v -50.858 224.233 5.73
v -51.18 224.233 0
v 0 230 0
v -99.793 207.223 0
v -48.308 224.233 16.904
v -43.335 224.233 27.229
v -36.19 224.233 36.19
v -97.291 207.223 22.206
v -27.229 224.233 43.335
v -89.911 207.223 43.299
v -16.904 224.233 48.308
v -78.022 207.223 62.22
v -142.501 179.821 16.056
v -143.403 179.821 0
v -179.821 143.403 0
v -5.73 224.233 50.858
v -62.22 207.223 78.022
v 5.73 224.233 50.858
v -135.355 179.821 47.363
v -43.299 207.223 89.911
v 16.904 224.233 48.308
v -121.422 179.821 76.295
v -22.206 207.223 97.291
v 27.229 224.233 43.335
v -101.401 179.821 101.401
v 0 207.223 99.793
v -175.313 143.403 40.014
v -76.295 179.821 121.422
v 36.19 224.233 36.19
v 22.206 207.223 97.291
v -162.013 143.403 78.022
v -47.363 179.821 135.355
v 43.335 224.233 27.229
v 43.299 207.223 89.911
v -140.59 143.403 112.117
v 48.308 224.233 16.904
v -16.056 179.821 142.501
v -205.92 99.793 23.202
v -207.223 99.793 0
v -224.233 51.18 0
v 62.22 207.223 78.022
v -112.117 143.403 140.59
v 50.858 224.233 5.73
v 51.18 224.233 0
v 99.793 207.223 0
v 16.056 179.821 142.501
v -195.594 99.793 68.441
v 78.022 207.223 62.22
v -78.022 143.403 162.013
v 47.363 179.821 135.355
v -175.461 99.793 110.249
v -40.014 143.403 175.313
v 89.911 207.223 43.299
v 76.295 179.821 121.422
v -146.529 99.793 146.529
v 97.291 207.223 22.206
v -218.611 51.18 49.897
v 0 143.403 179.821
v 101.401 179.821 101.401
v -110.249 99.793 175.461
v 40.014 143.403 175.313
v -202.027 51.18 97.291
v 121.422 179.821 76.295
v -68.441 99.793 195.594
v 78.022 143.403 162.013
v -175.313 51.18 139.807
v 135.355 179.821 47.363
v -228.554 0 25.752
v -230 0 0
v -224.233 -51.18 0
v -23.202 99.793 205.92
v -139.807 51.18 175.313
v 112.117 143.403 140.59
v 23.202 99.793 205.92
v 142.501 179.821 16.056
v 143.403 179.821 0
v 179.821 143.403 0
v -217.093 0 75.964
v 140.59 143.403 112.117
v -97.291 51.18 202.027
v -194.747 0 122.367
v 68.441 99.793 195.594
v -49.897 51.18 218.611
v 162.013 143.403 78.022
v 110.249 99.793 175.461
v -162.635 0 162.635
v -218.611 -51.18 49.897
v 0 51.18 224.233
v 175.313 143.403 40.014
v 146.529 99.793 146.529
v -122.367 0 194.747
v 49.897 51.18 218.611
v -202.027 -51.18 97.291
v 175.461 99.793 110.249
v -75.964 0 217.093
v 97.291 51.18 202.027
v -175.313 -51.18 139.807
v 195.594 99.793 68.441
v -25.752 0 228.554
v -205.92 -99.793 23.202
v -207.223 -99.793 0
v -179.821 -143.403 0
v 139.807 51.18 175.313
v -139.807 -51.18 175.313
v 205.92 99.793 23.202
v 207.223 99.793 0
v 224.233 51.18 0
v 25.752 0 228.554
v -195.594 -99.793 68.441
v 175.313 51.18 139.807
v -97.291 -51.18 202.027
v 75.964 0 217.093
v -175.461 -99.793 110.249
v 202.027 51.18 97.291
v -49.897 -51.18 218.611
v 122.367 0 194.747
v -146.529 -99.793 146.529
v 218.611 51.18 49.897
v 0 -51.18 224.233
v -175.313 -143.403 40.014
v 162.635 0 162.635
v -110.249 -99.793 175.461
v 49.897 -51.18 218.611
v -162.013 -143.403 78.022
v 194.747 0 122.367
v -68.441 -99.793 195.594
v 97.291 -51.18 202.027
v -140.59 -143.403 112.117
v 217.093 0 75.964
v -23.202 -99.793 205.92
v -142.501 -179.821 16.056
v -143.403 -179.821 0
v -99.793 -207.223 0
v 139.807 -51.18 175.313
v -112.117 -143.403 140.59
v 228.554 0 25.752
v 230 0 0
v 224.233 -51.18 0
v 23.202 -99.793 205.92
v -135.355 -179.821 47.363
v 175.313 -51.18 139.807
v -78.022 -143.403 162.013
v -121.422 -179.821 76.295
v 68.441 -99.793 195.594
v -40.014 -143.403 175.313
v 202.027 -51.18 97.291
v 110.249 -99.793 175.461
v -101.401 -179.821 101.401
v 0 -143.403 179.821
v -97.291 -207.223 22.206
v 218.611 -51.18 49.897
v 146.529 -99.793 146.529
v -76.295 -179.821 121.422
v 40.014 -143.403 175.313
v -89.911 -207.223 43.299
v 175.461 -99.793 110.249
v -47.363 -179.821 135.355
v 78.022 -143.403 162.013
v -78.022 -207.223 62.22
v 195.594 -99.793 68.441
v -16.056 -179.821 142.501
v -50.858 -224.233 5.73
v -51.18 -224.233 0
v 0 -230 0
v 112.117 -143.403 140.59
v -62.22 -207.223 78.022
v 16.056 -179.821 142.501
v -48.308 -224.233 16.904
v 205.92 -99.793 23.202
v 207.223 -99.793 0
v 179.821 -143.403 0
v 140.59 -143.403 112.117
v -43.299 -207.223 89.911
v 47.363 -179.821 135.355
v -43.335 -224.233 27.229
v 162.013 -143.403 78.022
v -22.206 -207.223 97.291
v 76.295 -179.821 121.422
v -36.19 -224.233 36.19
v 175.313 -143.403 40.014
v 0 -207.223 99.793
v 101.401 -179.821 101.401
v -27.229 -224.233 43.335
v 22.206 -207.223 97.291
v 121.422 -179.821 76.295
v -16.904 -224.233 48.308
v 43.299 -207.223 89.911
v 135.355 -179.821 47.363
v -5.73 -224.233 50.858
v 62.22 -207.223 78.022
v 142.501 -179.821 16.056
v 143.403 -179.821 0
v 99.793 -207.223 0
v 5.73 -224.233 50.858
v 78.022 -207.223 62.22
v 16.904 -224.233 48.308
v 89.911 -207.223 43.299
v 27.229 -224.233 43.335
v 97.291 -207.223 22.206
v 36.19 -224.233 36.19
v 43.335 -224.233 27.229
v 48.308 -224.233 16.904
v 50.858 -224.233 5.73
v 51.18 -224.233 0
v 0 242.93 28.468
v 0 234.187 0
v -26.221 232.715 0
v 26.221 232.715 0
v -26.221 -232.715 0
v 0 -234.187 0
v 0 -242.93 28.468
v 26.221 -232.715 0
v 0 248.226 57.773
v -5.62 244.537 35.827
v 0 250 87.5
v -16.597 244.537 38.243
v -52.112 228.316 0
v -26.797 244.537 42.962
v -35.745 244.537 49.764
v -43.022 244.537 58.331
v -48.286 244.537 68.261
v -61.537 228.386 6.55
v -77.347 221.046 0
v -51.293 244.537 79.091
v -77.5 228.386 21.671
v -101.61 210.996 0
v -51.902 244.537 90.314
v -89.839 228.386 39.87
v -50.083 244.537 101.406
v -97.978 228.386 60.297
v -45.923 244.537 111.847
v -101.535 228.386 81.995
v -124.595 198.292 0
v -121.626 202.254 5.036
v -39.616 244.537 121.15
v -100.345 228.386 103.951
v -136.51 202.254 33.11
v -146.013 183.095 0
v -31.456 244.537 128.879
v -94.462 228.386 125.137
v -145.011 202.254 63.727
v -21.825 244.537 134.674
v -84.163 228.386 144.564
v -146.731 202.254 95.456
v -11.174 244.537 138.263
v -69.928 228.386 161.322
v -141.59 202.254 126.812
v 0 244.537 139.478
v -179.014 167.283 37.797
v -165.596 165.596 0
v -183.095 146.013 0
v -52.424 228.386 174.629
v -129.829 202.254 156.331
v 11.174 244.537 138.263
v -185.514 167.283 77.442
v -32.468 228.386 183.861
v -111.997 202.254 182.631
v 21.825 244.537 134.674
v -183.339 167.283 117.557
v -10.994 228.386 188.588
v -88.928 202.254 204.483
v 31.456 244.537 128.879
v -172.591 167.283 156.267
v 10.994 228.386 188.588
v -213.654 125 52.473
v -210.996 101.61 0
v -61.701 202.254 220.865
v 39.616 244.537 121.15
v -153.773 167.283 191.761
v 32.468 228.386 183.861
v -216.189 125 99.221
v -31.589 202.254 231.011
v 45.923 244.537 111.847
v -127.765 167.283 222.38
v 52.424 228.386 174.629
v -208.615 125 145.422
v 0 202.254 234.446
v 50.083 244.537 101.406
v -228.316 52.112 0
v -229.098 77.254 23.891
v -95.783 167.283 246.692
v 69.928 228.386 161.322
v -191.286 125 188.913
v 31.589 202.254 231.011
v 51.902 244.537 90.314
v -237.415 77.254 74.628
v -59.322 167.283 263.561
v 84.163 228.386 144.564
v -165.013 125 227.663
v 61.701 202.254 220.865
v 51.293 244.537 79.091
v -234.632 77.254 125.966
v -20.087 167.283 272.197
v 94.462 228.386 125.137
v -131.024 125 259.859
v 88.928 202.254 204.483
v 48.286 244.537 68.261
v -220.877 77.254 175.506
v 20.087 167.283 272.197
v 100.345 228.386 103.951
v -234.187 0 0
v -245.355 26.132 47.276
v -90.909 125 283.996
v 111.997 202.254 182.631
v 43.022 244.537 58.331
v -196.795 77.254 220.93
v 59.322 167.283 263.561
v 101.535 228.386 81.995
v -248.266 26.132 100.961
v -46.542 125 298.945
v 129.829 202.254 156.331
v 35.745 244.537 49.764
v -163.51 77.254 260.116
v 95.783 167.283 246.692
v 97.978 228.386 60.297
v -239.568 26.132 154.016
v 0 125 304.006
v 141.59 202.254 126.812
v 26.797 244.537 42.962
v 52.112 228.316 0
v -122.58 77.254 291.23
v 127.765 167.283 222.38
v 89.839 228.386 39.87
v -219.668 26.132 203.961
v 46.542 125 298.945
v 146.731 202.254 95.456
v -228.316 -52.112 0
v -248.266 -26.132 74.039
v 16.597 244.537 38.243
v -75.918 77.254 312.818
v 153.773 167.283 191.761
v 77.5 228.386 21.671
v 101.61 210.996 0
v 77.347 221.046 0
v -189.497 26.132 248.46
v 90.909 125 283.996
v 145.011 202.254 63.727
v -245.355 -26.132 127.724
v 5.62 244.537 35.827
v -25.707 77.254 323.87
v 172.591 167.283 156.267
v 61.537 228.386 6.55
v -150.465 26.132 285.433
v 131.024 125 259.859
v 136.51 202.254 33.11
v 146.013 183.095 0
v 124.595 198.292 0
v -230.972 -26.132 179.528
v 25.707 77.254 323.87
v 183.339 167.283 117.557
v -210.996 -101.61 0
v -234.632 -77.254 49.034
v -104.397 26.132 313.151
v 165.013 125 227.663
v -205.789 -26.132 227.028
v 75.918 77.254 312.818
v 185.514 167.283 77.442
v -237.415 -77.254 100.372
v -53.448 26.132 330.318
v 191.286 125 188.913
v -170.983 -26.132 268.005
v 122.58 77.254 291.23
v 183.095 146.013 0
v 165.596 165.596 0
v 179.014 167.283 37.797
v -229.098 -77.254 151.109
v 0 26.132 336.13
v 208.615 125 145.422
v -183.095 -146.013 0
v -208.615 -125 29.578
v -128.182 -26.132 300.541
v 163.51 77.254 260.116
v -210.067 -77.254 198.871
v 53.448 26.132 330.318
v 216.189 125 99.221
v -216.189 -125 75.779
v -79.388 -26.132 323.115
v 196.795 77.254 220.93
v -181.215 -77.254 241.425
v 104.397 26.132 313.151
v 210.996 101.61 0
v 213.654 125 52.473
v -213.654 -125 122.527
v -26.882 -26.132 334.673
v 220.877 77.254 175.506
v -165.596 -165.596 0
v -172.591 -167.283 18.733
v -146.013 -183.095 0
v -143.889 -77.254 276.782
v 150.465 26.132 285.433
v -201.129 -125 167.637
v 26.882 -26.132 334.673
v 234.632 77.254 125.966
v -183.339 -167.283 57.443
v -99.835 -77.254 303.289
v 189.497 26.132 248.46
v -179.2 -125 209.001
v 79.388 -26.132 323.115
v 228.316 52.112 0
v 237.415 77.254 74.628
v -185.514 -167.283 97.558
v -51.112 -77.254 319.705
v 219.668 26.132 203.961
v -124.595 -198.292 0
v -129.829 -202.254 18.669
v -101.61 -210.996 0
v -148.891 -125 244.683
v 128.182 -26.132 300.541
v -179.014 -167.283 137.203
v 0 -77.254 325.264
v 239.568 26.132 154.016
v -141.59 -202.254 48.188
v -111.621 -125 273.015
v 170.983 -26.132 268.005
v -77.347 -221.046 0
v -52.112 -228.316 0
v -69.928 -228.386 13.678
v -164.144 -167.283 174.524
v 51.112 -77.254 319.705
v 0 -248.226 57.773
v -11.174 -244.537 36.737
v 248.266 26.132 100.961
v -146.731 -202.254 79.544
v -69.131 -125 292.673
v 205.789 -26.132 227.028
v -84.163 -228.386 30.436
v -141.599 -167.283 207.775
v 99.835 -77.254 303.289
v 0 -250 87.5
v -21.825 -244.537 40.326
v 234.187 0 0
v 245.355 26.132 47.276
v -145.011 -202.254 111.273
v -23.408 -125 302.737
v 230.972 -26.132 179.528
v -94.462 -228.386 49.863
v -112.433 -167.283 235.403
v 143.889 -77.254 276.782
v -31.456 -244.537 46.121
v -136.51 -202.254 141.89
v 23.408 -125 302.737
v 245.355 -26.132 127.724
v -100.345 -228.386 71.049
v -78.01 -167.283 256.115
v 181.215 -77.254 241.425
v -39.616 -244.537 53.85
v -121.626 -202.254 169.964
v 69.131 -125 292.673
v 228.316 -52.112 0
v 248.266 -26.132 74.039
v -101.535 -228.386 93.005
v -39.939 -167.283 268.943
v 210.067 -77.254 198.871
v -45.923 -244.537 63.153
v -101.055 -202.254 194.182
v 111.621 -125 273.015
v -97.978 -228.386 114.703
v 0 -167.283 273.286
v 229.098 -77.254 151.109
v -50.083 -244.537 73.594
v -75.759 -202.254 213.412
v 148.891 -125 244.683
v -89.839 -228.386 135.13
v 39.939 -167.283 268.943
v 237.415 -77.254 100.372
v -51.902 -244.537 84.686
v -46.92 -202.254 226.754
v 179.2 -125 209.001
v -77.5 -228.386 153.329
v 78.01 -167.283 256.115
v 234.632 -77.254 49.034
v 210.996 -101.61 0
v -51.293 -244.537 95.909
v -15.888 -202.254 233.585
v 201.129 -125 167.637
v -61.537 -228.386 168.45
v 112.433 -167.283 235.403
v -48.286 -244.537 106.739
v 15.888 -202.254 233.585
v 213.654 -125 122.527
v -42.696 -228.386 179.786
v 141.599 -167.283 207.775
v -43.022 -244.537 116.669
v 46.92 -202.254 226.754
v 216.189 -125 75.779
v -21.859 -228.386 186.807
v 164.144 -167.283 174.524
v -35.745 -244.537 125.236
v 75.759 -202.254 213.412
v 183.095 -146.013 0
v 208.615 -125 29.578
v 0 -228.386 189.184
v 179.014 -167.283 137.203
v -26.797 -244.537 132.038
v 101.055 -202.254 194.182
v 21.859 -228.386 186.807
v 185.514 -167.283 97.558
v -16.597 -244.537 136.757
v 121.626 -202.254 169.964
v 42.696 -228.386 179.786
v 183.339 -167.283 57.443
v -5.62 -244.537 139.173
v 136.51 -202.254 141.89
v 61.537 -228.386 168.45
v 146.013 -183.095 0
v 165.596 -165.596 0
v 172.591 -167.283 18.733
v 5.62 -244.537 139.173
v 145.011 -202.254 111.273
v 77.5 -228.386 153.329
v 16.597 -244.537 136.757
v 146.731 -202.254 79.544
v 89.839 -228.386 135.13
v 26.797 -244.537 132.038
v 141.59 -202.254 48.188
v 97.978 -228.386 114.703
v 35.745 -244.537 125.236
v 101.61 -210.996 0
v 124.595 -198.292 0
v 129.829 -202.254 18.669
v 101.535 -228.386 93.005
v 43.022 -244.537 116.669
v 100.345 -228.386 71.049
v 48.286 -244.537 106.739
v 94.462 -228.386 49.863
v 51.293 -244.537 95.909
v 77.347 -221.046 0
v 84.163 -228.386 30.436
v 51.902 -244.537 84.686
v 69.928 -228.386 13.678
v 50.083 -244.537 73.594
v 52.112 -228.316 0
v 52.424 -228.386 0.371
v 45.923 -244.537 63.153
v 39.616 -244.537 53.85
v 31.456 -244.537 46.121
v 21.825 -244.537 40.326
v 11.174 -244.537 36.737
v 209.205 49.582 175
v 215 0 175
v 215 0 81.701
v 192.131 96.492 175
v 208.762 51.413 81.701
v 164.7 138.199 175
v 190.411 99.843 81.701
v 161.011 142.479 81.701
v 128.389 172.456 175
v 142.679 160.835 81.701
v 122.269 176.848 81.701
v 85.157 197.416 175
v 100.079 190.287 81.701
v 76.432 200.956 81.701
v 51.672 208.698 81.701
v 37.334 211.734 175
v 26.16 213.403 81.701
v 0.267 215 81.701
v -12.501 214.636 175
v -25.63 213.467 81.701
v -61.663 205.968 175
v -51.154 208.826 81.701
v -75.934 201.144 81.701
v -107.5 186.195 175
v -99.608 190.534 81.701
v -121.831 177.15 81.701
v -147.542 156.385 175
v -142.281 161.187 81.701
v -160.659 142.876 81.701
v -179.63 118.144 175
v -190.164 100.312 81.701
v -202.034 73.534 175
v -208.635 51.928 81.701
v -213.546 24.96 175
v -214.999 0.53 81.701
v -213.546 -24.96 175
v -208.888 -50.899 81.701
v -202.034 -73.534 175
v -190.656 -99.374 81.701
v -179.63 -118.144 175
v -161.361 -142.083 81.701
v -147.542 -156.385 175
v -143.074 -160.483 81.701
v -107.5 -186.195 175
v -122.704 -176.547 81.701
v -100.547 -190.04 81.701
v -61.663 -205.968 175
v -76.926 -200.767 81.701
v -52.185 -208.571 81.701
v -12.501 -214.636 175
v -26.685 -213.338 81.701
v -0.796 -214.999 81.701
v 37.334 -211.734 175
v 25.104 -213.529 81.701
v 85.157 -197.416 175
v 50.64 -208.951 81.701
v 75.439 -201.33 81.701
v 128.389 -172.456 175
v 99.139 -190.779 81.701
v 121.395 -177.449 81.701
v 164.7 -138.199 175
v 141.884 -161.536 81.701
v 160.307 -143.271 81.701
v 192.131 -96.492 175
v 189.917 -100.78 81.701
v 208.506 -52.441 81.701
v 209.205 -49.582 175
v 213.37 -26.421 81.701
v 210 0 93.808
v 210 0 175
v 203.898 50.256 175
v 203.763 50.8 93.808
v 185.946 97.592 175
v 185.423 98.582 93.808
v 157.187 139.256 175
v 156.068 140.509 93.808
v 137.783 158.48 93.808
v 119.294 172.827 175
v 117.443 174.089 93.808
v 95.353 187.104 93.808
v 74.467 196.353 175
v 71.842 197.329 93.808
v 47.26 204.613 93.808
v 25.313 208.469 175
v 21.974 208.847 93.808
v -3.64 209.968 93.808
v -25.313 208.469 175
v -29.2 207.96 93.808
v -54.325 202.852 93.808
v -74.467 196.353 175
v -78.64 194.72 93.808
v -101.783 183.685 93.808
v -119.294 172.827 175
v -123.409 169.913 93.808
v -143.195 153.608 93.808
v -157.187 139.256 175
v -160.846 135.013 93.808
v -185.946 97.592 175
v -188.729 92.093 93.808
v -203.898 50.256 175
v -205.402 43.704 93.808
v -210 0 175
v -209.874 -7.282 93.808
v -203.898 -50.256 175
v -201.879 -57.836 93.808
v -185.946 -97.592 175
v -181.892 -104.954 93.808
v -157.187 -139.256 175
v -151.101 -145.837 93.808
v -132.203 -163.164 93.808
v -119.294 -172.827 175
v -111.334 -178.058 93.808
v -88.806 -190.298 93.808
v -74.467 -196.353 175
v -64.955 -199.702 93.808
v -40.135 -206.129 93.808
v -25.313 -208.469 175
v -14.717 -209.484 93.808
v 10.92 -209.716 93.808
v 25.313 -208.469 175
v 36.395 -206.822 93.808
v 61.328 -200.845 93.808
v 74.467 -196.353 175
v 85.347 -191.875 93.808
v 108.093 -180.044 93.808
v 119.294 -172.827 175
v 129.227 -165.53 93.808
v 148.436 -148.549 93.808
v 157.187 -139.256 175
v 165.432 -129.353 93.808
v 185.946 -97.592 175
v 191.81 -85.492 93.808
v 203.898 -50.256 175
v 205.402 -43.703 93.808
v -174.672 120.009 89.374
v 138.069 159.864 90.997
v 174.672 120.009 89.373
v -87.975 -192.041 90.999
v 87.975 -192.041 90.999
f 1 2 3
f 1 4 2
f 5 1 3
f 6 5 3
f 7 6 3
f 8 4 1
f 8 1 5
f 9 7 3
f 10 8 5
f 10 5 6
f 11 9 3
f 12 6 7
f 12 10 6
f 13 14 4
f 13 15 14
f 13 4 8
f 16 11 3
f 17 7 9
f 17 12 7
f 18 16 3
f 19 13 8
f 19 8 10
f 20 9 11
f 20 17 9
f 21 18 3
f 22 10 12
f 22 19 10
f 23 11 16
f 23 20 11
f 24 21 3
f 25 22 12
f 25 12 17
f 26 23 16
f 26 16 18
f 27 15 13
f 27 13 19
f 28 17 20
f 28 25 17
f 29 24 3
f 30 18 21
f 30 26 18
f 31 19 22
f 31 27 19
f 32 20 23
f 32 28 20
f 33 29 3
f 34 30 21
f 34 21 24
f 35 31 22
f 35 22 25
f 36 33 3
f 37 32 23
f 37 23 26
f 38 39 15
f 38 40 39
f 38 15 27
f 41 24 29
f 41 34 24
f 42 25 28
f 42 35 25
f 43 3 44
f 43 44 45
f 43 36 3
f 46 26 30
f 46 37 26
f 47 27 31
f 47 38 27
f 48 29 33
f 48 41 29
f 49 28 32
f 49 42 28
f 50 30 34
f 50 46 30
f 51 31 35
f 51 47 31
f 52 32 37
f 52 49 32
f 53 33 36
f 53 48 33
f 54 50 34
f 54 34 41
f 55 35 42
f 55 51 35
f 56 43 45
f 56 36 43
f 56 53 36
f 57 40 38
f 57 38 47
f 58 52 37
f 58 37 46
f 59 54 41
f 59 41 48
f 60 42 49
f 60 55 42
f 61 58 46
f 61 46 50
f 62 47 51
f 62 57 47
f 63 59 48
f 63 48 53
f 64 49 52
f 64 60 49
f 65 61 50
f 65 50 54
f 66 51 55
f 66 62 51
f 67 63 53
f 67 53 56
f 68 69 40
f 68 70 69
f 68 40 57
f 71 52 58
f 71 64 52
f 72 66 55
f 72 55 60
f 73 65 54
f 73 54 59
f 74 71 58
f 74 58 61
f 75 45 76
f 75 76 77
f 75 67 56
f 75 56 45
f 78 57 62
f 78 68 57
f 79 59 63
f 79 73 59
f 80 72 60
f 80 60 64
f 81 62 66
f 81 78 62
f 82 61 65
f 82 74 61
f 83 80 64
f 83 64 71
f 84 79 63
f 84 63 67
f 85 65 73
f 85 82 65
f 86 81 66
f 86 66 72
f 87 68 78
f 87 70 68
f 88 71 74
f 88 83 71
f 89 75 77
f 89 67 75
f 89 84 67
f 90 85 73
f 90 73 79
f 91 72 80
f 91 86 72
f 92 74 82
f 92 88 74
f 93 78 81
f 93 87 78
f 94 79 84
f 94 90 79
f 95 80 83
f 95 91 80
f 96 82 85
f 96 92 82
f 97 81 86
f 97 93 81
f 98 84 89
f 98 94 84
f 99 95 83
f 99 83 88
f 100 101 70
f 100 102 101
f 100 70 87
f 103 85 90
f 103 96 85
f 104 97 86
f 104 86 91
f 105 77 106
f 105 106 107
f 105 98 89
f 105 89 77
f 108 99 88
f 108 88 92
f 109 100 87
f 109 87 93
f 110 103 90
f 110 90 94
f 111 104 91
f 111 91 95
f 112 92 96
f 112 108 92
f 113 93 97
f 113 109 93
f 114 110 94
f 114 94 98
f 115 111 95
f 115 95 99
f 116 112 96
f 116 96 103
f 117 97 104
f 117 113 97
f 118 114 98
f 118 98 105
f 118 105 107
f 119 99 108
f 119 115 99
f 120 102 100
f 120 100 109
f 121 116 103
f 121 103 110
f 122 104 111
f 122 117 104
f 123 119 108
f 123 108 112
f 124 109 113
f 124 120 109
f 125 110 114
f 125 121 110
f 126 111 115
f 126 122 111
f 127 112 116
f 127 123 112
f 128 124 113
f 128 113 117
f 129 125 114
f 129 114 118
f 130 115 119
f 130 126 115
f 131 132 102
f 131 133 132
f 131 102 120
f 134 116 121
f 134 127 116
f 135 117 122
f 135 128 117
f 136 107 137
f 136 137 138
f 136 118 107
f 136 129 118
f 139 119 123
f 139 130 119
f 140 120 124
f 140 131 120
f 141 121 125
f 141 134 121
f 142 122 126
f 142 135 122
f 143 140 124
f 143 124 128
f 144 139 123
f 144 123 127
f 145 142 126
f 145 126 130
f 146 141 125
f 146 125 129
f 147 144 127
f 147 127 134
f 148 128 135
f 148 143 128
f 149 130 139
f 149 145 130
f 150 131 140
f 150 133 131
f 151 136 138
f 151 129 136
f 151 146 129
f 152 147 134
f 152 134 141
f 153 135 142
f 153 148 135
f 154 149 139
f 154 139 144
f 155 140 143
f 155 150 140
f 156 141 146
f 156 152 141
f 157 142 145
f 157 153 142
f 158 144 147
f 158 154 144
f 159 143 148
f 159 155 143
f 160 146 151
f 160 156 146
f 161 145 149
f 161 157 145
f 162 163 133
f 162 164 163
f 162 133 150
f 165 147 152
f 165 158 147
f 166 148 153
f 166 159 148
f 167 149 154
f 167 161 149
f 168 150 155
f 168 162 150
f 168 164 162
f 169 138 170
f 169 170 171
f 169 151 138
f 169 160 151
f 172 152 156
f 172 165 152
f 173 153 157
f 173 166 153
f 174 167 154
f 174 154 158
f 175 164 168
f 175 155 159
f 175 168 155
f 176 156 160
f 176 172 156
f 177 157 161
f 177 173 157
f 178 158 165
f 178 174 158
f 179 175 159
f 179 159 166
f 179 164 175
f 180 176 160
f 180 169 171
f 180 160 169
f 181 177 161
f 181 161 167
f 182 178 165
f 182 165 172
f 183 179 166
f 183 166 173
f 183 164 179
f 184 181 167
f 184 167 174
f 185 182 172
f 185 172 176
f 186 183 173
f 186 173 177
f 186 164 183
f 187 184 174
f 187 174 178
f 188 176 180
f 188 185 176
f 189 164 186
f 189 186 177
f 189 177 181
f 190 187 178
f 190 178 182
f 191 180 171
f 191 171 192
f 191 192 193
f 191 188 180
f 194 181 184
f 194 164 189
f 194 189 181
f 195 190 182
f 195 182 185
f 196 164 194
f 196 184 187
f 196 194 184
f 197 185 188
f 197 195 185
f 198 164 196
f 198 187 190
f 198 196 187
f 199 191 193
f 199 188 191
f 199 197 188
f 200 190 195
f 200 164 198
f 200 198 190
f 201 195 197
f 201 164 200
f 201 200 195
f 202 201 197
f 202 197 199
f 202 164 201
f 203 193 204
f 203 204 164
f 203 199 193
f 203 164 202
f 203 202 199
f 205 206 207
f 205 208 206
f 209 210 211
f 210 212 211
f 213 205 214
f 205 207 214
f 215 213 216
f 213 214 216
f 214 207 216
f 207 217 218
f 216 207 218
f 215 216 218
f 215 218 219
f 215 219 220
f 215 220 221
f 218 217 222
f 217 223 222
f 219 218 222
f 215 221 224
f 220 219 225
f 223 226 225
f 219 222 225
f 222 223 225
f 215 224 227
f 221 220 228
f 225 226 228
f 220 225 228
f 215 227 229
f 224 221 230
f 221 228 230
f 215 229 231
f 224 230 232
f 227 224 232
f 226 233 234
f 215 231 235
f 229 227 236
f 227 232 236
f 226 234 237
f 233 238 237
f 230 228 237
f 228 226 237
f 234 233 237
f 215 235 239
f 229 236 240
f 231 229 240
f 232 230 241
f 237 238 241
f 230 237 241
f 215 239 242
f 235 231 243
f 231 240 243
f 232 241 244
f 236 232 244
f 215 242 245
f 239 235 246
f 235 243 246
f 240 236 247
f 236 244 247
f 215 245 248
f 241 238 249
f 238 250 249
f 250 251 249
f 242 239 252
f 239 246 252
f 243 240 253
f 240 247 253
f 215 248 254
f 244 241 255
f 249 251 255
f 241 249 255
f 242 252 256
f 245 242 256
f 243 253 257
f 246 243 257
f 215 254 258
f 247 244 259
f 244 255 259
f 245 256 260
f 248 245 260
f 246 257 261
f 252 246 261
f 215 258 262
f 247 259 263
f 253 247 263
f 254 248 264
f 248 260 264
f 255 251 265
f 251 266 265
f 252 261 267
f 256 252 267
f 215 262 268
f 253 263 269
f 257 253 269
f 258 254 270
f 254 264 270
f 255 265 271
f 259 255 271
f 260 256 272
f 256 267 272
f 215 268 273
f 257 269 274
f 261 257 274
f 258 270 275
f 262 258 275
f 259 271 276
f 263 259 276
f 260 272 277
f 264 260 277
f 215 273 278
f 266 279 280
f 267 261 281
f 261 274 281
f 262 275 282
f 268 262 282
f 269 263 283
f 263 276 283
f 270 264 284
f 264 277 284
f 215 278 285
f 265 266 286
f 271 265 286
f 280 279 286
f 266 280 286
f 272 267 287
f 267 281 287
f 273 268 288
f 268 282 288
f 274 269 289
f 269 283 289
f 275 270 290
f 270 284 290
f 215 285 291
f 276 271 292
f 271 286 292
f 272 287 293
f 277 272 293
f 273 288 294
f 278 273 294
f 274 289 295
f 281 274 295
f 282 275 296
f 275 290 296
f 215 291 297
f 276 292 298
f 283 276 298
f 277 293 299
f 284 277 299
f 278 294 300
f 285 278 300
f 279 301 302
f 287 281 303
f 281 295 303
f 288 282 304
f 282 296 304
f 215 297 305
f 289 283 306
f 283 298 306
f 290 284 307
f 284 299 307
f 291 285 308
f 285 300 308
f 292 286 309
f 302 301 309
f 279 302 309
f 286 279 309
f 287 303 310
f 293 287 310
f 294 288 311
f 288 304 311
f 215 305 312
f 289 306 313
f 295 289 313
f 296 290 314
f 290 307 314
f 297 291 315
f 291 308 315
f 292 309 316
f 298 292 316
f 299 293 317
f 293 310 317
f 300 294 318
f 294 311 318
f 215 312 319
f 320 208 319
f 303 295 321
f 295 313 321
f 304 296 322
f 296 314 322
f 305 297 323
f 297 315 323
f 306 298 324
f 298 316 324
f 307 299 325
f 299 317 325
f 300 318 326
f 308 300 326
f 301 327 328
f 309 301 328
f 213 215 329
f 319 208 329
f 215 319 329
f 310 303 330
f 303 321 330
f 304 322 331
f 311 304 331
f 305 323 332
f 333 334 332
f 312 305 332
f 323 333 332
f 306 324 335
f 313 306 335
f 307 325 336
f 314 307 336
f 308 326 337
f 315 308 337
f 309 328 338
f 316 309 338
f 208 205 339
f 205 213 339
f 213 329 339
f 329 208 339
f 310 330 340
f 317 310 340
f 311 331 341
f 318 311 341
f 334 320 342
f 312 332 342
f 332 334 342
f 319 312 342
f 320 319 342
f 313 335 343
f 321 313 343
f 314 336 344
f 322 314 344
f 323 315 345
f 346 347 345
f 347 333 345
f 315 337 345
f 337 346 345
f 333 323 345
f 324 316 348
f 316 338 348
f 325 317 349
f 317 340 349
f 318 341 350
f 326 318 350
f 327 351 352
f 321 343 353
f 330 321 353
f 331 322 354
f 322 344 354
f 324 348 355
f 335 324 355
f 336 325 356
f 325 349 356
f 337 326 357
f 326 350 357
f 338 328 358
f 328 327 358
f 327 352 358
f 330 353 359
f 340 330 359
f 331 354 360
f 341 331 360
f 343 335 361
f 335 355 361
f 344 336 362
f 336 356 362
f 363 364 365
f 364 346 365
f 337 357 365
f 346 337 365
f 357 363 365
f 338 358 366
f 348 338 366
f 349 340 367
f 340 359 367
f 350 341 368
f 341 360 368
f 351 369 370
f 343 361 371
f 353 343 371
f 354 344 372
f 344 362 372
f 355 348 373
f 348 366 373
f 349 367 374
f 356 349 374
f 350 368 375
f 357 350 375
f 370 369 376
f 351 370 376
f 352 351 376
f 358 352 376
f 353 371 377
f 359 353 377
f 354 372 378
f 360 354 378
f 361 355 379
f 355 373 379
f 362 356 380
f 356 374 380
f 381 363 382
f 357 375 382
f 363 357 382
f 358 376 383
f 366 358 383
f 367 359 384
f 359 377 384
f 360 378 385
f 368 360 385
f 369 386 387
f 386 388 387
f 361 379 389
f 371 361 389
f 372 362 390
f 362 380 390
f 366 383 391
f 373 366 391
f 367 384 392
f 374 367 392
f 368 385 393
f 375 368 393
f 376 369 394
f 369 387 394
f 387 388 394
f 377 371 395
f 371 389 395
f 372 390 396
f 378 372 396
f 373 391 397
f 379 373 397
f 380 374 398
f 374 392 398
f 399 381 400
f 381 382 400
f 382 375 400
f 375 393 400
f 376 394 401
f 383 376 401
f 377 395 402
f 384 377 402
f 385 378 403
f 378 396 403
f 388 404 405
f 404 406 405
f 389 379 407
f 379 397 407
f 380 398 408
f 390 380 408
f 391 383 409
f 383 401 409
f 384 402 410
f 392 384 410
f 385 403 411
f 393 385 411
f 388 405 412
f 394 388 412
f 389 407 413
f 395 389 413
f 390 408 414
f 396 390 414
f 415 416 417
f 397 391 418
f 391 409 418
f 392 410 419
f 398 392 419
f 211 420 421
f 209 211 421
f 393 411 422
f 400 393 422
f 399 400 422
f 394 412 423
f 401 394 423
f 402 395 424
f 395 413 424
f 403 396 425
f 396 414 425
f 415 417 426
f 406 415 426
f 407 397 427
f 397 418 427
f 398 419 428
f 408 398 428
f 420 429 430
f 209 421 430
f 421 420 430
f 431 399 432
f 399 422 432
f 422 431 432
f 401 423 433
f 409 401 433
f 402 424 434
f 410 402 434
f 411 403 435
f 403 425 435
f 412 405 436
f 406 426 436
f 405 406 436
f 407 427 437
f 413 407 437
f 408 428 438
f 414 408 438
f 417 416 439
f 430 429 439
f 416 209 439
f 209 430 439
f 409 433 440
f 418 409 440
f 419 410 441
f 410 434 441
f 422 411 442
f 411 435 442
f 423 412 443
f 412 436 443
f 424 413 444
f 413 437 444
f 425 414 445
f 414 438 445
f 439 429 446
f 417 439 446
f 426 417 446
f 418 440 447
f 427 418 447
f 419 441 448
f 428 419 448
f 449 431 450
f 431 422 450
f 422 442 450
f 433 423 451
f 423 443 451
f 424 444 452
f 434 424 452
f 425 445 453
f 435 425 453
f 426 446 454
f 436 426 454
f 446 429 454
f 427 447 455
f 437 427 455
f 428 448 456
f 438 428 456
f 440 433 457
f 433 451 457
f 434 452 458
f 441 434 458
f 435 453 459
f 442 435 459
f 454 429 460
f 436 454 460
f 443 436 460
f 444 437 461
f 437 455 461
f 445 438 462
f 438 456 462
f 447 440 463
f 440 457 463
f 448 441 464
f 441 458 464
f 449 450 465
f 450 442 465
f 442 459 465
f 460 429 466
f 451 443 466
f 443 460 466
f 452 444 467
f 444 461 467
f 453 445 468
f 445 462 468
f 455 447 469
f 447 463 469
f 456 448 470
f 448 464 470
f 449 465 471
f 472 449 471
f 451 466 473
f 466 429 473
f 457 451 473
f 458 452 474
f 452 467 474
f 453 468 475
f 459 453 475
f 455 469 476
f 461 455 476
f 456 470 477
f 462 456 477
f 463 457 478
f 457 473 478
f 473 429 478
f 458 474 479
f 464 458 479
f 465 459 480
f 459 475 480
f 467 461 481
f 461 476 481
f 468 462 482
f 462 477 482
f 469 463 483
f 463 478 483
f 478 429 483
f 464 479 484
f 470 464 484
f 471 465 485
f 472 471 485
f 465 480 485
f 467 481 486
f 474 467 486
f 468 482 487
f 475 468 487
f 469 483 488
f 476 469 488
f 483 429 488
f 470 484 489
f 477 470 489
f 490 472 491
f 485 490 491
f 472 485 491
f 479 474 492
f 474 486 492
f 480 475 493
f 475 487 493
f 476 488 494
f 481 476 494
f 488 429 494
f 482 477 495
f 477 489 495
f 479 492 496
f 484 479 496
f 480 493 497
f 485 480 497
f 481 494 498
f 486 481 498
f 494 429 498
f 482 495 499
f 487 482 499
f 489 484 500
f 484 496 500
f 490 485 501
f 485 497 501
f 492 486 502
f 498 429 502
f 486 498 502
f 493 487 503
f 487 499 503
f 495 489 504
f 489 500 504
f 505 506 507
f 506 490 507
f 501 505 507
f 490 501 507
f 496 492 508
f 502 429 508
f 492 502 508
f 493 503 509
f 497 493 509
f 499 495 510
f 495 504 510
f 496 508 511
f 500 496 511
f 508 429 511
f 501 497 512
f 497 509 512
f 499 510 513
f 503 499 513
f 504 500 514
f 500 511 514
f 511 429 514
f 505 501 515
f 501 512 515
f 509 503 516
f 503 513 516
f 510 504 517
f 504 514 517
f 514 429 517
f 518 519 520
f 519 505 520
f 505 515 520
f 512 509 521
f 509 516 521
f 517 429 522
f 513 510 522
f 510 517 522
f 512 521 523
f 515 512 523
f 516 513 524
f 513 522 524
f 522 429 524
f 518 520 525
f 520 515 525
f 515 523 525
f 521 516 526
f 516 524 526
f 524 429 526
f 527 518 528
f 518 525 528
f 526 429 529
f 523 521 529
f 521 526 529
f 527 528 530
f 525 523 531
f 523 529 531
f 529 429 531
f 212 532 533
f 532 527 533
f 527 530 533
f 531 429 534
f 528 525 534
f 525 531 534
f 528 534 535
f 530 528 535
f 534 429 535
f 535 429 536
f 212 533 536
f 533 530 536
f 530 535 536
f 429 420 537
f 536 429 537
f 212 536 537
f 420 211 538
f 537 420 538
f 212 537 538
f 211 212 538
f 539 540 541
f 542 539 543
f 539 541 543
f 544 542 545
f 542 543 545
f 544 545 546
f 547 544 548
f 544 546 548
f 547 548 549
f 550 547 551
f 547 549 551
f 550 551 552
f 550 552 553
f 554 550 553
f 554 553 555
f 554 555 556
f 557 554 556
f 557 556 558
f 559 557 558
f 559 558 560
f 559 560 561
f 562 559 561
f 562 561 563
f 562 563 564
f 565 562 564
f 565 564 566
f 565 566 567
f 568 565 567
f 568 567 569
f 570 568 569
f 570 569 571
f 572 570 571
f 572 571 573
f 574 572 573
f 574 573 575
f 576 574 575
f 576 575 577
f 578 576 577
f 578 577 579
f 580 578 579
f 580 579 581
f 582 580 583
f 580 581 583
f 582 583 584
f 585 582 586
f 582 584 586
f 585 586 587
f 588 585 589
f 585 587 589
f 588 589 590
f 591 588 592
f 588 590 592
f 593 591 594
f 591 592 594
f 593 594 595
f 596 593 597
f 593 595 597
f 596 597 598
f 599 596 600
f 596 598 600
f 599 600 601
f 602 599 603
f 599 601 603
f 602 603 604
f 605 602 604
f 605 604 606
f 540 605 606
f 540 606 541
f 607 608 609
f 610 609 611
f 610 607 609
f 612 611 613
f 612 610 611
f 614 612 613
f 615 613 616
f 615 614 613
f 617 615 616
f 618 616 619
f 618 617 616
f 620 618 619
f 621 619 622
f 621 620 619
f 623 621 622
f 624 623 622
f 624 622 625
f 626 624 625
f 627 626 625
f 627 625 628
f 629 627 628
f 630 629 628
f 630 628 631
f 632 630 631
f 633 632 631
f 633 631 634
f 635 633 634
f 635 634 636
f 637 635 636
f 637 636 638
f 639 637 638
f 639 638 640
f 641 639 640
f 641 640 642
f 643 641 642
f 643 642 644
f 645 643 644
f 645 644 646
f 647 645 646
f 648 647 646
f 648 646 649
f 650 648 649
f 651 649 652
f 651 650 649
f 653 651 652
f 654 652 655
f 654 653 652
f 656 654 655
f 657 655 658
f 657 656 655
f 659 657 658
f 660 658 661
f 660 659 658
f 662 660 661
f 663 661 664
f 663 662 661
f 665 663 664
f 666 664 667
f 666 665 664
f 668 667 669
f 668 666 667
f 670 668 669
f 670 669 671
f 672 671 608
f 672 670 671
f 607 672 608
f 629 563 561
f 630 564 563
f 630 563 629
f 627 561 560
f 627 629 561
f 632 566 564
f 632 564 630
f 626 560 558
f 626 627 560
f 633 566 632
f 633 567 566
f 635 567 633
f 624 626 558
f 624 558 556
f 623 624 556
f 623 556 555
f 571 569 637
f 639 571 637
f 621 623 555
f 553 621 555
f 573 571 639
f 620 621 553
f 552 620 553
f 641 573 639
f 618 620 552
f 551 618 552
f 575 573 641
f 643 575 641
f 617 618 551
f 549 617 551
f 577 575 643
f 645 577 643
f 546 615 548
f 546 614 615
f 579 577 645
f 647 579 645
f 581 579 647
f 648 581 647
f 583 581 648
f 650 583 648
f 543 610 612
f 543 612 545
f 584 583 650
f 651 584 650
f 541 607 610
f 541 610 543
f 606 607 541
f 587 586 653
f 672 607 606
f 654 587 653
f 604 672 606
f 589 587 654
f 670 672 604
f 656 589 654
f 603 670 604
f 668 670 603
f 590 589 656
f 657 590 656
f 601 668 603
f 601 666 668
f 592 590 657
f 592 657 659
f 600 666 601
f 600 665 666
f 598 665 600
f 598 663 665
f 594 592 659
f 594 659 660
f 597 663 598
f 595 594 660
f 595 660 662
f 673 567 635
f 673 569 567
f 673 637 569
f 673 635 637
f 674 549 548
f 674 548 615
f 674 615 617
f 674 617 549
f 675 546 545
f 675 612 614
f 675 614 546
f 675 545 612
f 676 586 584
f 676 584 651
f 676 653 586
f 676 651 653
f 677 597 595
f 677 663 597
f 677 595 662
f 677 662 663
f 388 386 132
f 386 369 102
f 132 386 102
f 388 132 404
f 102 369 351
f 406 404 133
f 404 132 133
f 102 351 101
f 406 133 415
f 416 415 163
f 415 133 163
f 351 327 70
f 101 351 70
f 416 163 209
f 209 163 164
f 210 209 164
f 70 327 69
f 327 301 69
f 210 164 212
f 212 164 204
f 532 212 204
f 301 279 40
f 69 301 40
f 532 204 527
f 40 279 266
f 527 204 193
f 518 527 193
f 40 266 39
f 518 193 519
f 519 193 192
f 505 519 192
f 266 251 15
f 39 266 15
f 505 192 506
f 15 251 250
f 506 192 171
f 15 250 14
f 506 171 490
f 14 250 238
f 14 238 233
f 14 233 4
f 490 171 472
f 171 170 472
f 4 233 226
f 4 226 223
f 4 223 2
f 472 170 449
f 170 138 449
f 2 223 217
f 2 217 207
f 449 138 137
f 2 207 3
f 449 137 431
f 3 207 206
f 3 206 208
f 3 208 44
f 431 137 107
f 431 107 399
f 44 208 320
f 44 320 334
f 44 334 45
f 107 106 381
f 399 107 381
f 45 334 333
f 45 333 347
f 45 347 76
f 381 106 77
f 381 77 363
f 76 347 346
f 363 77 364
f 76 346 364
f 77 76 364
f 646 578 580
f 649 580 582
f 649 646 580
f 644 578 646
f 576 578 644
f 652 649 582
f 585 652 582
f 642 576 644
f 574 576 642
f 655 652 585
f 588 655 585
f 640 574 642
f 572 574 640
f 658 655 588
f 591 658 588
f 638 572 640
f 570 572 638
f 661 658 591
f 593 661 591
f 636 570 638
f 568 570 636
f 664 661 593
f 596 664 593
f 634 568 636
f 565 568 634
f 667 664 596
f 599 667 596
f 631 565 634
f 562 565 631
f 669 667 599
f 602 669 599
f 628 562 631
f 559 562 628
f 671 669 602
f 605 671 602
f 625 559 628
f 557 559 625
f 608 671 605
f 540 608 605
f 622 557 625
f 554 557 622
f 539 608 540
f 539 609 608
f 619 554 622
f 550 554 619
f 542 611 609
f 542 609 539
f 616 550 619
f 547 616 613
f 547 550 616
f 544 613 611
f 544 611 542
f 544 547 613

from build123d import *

# Parameters (mm, degrees)
SKETCH_4_R              = 215
SKETCH_4_R_2            = 210
EXTRUDE_1_DEPTH         = 175
CUT_EXTRUDE_START       = -162.5
CUT_EXTRUDE_3_OUTLINE_W = 472
CUT_EXTRUDE_3_OUTLINE_H = 472
CUT_EXTRUDE_3_DEPTH     = 162.5


# Read off the part's stored shape, not the designer's step: 切除-拉伸3
with BuildPart() as part:
    # 草图4 → 凸台-拉伸1 (new body)
    with BuildSketch(Plane.XY):
        Circle(SKETCH_4_R)
        Circle(SKETCH_4_R_2, mode=Mode.SUBTRACT)
    extrude(amount=EXTRUDE_1_DEPTH)


with BuildPart() as body_2:
    # 草图5 → 旋转5 (revolve)
    with BuildSketch(Plane(origin=(0, 0, 0), x_dir=(0, 0, -1), z_dir=(1, 0, 0))):
        with BuildLine():
            Line((-87.5, -250), (-87.5, 250))
            ThreePointArc((-87.5, 250), (162.5, 0), (-87.5, -250))
        make_face()
    revolve(axis=Axis((0, -250, 87.5), (0, 1, 0)))

    # 切除-拉伸3 outline → 切除-拉伸3 (cut)
    with BuildSketch(Plane.XY.offset(CUT_EXTRUDE_START)):
        Rectangle(CUT_EXTRUDE_3_OUTLINE_W, CUT_EXTRUDE_3_OUTLINE_H)
    extrude(amount=CUT_EXTRUDE_3_DEPTH, mode=Mode.SUBTRACT)


with BuildPart() as cut_revolve_2_tool:
    # 草图8 → 切除-旋转2 (revolve)
    with BuildSketch(Plane.XY):
        with BuildLine():
            Line((0, -230), (0, 230))
            ThreePointArc((0, 230), (230, 0), (0, -230))
        make_face()
    revolve(axis=Axis((0, -230, 0), (0, 1, 0)))


with BuildPart() as part_1:
    add(part.part)

    # 切除-旋转2: cut by cut_revolve_2_tool
    add(cut_revolve_2_tool.part, mode=Mode.SUBTRACT)


with BuildPart() as body_2_1:
    add(body_2.part)

    # 切除-旋转2: cut by cut_revolve_2_tool
    add(cut_revolve_2_tool.part, mode=Mode.SUBTRACT)


solid = Compound([part_1.part, body_2_1.part])
